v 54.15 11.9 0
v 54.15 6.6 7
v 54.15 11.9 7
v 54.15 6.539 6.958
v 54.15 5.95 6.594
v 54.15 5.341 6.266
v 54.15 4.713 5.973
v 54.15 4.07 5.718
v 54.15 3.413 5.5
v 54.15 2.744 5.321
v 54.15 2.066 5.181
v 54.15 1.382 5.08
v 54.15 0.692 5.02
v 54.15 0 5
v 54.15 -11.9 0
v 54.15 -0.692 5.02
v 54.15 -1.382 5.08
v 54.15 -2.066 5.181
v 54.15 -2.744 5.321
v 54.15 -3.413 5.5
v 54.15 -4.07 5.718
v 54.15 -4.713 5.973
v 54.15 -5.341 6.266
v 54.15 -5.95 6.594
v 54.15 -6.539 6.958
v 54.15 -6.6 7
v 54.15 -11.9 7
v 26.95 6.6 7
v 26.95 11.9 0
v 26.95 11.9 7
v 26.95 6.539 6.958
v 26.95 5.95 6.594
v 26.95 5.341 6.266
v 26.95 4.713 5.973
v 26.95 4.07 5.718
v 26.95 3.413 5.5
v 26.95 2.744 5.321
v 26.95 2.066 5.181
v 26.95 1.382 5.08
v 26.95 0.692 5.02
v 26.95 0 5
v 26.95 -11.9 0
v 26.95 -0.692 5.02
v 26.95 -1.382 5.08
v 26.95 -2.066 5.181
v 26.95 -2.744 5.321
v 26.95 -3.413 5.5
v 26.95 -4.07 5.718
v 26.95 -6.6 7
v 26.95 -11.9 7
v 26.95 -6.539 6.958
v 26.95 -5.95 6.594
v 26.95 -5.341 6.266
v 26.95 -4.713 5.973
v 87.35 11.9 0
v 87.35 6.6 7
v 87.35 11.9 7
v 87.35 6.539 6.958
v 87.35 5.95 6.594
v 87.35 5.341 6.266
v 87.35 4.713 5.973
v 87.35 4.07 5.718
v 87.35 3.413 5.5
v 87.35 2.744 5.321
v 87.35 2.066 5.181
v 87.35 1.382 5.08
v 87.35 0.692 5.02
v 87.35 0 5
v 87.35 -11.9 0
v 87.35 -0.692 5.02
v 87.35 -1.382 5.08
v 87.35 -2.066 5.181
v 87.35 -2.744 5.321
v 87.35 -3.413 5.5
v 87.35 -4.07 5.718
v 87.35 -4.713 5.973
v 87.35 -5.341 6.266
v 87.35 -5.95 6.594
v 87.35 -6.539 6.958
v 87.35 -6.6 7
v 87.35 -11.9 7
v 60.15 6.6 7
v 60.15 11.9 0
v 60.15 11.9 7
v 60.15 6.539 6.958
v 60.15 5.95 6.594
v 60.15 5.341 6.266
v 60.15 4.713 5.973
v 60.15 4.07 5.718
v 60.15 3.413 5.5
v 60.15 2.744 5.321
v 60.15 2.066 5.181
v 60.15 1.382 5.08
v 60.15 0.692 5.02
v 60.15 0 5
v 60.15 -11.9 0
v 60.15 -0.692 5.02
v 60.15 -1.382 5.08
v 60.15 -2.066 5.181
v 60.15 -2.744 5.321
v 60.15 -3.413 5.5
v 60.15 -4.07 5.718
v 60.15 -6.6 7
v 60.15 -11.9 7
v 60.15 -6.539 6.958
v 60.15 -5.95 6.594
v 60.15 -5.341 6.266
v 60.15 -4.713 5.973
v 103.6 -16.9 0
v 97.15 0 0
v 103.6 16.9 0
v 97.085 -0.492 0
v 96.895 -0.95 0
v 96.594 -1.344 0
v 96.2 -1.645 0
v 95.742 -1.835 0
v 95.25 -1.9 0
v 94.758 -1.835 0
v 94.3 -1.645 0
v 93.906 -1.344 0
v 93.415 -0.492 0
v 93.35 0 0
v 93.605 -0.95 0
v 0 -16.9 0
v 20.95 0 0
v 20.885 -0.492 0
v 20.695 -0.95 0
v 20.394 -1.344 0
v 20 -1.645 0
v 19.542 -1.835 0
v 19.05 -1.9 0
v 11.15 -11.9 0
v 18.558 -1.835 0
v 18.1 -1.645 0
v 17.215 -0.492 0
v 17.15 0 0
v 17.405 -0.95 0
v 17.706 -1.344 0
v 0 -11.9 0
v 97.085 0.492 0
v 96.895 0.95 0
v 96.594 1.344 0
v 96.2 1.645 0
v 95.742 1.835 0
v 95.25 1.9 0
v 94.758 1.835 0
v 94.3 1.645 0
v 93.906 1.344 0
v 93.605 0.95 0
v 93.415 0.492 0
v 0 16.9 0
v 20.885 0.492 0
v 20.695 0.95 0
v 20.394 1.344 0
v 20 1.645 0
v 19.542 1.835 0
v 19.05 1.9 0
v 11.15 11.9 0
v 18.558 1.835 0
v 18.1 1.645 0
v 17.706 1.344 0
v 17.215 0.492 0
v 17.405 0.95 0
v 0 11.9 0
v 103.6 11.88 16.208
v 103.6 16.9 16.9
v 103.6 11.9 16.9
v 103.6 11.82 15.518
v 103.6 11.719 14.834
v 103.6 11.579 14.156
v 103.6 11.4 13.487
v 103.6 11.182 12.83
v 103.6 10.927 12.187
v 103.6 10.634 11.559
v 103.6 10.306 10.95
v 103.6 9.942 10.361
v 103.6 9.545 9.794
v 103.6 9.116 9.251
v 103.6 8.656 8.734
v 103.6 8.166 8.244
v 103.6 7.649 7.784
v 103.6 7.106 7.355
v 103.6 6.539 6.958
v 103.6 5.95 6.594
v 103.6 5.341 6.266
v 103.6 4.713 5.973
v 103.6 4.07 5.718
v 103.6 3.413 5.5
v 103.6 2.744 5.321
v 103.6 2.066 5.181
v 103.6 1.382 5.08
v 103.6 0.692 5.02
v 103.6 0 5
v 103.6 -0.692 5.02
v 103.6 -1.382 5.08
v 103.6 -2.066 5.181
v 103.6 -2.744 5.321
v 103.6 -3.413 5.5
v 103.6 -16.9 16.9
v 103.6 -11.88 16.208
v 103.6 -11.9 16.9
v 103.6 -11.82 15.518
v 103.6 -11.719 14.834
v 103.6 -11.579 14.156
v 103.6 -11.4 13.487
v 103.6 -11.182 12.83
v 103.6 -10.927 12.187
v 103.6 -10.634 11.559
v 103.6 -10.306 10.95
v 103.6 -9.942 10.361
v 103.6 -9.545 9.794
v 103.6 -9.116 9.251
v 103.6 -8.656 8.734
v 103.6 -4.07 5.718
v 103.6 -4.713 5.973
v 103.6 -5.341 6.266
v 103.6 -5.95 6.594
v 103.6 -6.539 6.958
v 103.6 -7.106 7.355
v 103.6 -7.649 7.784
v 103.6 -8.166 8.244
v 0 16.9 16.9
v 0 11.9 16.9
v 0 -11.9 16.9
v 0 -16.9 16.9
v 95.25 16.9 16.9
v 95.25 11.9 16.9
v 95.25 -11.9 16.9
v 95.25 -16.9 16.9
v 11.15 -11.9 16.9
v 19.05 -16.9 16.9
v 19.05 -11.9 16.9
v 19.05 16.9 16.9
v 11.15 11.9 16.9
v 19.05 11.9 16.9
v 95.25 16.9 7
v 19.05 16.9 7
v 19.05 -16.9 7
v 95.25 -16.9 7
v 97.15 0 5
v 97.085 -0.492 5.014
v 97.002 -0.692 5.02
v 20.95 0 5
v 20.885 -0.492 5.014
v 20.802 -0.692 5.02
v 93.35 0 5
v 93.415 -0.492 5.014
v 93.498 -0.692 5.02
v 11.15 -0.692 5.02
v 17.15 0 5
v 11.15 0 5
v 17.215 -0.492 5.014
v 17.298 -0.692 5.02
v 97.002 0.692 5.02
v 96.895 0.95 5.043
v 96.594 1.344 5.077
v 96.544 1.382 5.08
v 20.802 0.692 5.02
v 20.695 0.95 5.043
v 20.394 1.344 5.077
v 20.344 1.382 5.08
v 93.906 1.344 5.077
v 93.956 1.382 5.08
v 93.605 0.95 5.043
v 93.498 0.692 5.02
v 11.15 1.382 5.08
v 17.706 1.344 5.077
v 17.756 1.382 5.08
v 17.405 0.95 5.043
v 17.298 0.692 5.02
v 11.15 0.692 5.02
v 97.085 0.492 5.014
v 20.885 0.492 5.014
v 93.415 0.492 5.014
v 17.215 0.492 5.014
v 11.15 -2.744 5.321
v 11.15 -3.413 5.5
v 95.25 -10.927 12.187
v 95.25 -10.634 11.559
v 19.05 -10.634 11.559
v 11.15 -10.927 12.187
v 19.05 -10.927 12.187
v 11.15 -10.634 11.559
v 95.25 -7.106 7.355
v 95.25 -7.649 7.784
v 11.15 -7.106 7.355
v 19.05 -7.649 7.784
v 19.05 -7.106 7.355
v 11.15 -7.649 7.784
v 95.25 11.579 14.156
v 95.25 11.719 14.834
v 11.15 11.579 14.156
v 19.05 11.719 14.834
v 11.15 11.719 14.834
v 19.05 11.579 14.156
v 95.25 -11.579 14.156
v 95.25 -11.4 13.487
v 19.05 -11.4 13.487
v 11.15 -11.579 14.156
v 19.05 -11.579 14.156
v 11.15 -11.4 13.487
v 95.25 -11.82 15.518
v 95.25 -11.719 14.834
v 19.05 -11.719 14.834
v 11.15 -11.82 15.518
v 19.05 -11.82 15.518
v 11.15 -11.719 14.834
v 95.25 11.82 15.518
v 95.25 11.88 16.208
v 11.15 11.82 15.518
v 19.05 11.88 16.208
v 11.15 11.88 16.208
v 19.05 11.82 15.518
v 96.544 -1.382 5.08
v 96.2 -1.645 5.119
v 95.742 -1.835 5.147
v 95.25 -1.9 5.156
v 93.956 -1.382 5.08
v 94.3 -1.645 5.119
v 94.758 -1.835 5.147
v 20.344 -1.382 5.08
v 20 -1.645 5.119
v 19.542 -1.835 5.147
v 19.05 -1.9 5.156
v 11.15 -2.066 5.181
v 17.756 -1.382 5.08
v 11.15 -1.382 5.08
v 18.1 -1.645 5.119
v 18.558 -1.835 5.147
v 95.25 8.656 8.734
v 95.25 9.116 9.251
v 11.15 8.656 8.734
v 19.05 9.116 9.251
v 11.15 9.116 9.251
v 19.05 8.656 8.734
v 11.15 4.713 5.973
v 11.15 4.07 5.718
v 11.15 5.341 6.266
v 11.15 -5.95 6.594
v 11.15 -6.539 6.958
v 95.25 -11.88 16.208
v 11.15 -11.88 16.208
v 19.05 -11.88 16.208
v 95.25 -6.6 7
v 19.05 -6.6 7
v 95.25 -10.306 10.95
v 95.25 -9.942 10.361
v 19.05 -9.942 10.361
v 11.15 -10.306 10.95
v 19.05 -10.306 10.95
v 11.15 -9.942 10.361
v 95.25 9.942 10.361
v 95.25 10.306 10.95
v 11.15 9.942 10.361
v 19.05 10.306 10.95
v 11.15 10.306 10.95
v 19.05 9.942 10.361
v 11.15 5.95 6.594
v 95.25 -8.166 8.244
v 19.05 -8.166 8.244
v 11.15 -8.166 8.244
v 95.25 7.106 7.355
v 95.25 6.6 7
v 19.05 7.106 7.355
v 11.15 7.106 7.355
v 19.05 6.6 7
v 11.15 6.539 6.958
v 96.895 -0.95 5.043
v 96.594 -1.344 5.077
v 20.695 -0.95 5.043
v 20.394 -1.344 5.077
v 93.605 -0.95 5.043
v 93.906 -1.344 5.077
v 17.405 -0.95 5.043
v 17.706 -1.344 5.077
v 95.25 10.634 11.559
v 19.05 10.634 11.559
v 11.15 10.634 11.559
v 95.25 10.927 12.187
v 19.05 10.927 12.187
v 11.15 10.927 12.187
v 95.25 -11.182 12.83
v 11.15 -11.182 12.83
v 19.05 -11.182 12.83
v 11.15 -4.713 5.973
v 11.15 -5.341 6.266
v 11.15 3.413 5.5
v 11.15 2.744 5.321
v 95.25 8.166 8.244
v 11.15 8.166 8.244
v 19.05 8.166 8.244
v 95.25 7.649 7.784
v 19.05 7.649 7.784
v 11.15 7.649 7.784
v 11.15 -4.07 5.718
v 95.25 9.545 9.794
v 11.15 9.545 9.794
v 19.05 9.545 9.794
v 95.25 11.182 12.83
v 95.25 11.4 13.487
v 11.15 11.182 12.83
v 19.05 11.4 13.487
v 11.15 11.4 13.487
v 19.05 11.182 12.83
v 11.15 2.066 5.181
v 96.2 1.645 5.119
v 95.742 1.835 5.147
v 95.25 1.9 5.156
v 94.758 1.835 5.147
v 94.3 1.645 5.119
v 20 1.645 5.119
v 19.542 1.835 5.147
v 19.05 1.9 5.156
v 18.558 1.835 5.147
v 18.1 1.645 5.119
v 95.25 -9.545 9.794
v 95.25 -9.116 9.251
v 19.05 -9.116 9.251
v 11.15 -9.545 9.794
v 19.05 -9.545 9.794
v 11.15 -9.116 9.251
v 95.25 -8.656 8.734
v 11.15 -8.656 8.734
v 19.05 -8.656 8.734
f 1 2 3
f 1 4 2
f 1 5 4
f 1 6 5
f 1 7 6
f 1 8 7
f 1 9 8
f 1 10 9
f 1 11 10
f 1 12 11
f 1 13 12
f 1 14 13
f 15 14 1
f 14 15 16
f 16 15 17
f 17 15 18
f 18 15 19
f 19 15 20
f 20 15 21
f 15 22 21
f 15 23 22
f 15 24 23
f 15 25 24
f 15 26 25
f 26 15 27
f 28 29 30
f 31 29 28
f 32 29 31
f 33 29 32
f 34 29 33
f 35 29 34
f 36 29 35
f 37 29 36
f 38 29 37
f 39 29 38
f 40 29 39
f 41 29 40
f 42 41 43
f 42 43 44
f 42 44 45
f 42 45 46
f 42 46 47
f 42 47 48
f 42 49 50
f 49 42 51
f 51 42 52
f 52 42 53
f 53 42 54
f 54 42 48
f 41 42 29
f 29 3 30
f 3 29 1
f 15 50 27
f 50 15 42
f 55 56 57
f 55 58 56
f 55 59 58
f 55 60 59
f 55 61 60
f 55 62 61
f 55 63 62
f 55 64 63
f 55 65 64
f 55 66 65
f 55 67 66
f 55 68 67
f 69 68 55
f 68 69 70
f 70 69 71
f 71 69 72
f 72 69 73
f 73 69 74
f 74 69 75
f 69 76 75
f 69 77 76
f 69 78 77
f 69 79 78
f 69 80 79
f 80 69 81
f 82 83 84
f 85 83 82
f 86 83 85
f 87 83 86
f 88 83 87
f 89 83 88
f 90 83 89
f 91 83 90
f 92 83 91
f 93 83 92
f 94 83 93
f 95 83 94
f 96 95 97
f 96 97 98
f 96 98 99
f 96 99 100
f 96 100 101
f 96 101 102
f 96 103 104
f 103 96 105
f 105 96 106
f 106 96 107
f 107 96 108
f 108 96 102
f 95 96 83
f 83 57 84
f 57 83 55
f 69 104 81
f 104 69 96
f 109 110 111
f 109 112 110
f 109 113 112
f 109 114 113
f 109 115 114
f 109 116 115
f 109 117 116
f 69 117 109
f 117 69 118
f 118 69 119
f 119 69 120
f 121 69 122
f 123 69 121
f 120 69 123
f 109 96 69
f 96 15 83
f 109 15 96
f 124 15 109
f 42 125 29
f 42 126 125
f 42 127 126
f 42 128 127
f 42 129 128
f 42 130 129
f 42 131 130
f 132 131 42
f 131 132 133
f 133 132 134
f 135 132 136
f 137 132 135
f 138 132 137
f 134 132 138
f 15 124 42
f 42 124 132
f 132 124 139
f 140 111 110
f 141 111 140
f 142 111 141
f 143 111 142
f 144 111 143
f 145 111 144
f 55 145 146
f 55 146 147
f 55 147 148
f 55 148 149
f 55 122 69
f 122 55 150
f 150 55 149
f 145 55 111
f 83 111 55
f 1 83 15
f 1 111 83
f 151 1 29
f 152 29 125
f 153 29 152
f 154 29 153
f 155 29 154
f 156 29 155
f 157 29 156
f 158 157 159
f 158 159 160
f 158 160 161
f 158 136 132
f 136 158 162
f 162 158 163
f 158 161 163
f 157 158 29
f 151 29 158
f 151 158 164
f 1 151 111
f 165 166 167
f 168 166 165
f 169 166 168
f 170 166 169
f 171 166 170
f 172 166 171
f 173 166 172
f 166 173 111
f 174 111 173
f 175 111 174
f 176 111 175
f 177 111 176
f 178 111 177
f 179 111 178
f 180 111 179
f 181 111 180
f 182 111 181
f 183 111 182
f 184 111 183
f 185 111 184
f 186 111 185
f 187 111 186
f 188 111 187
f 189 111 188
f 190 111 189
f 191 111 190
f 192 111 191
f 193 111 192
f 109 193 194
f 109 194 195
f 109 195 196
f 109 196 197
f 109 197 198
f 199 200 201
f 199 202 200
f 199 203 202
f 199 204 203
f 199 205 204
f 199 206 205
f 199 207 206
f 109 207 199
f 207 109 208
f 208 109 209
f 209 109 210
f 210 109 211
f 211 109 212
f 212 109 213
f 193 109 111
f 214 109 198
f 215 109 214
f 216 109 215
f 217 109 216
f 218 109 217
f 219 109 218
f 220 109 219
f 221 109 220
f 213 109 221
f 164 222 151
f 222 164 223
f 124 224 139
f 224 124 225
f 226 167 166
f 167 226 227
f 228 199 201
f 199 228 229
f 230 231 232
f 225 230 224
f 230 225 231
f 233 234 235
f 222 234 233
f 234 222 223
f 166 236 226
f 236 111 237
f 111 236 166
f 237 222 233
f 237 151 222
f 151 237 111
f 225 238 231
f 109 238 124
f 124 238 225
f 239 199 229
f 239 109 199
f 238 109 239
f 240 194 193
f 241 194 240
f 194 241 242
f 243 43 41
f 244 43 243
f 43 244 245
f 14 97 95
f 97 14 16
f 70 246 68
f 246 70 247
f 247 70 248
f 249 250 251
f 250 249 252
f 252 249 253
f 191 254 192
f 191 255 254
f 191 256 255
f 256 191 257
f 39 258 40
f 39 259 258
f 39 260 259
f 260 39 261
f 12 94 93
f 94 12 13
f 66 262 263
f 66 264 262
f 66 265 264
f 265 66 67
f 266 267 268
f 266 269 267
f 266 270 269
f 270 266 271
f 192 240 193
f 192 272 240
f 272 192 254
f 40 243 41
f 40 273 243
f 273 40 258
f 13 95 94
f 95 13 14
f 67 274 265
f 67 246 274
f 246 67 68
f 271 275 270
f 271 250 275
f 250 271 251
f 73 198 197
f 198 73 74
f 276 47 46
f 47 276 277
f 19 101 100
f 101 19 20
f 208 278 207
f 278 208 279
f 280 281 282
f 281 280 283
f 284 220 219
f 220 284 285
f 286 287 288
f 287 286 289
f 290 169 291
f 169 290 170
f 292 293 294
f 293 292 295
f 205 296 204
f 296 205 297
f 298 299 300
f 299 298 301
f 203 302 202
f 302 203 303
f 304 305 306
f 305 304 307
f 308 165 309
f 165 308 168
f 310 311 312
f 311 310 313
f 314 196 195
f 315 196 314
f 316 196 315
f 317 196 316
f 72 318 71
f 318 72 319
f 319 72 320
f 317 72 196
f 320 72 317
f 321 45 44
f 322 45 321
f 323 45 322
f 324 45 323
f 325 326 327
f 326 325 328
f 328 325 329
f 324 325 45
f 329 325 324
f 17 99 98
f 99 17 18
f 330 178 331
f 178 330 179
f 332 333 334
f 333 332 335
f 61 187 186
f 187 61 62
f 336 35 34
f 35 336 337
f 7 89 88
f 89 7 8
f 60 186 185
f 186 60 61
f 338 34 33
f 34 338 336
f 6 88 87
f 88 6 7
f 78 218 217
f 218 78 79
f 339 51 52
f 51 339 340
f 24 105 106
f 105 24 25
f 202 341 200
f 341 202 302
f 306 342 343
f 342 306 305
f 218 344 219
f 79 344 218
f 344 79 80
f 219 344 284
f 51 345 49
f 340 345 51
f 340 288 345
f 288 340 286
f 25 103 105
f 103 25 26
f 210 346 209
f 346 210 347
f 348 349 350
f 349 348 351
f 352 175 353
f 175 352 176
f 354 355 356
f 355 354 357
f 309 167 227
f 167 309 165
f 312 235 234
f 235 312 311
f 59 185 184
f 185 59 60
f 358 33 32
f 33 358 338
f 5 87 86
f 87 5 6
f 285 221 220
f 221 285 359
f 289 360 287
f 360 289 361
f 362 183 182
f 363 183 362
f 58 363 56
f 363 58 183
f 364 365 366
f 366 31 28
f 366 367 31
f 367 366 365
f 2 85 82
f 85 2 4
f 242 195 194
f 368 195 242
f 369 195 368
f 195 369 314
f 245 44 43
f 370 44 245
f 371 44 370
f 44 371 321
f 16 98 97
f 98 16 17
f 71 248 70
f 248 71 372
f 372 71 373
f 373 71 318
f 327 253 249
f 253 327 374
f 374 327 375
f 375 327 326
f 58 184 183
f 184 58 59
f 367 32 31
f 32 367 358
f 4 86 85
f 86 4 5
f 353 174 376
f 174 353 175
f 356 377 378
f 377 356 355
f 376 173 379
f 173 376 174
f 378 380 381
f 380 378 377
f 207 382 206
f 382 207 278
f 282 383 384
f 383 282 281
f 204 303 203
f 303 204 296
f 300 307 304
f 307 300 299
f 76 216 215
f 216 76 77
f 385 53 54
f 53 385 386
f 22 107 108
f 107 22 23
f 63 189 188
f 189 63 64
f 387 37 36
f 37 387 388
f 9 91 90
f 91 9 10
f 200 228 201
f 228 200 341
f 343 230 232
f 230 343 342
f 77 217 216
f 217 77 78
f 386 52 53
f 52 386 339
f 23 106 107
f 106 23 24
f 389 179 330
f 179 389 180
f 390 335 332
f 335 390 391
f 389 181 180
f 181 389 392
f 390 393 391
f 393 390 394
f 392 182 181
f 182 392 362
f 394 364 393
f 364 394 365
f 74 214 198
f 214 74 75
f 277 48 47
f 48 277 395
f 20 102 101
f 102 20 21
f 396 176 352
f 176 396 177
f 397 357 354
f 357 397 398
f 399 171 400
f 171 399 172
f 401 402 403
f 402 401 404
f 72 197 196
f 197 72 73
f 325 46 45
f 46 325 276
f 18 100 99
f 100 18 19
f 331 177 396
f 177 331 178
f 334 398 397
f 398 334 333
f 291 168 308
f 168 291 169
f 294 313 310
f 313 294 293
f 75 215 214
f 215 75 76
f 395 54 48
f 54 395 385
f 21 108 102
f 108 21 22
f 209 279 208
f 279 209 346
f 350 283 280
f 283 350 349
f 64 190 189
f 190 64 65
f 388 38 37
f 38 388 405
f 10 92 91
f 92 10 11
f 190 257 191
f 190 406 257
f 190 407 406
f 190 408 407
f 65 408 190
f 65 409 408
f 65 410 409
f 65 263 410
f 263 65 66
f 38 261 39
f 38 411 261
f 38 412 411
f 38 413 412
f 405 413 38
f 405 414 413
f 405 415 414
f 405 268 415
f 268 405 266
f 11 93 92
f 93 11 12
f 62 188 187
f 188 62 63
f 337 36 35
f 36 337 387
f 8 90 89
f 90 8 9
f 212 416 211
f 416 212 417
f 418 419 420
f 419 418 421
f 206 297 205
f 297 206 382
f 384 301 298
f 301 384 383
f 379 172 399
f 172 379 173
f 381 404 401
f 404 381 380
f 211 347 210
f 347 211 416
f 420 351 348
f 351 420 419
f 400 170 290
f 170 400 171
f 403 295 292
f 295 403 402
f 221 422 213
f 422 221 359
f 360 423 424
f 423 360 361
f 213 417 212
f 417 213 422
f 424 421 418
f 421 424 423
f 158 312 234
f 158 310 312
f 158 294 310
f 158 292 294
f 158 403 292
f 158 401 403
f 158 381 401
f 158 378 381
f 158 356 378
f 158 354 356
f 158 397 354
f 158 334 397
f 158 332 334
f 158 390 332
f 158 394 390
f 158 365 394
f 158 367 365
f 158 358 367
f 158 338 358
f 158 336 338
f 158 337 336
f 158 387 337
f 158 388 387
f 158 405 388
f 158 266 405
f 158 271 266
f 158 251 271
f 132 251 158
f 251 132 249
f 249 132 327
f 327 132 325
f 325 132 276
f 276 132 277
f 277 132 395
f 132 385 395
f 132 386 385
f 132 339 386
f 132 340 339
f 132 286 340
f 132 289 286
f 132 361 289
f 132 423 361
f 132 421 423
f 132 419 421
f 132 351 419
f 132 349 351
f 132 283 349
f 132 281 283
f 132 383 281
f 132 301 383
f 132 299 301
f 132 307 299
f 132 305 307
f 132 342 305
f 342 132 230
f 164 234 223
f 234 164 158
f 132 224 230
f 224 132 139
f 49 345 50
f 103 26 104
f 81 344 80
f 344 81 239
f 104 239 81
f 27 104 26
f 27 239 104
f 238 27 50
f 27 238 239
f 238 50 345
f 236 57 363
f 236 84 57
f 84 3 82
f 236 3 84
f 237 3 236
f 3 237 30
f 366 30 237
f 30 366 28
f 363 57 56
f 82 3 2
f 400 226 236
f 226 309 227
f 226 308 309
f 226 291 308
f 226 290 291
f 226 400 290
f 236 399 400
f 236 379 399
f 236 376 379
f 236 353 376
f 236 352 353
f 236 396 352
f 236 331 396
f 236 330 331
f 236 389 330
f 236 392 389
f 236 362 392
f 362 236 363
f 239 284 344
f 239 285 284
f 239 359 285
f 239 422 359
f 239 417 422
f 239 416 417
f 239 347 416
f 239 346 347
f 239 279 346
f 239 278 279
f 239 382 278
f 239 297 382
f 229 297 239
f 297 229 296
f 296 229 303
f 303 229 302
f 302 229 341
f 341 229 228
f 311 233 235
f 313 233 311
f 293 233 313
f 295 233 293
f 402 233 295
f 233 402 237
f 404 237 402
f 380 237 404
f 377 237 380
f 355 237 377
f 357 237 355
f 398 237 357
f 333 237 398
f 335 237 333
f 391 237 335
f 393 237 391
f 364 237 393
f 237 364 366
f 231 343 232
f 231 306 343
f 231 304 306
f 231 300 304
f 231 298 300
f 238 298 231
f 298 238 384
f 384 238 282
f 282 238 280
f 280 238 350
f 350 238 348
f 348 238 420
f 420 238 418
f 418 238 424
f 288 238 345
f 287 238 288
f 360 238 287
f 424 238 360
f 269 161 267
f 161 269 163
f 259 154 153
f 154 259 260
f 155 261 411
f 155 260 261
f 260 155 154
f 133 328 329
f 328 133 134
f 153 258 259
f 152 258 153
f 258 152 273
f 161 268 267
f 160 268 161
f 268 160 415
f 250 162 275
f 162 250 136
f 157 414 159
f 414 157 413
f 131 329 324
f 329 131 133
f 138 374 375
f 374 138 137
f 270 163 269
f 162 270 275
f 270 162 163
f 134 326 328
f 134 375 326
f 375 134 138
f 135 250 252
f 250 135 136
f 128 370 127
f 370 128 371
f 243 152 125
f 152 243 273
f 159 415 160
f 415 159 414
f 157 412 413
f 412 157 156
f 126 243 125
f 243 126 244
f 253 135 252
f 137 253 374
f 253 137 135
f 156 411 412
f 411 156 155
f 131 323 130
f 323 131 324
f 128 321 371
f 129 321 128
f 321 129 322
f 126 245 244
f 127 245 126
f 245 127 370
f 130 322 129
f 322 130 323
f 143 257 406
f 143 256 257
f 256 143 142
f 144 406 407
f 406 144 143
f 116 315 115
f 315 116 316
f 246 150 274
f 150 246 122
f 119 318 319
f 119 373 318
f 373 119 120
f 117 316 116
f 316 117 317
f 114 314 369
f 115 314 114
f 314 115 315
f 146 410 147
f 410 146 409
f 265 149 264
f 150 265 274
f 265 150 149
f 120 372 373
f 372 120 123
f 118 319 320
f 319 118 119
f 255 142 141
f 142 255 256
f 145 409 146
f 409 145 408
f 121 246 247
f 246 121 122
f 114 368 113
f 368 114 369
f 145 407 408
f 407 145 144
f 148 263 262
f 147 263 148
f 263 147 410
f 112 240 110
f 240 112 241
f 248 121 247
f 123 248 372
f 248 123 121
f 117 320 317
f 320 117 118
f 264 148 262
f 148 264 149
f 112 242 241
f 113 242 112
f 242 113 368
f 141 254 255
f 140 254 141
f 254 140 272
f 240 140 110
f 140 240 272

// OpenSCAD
//Drill guide for Mostly Printed CNC Z Pipe
//7/3/2015  By: David Bunch
//Revised center cuts for larger Diameter holes to work better

//CUSTOMIZER VARIABLES

//1. Spacing between Nuts (Standard is 76.2mm)
NutSpacing = 76.2;      //(I used 53mm for the rotary tool I am using)

//2. Dia of Drill Hole (9/64" Drill bit, Added .2mm for slip fit)
//M3 = 3.8;
DrSize = 3.8;

//3. Pipe Dia. to Use (Added 0.8 for slight tight fit)
OD = 23.8;              //23.7mm was a little tight & 24.0 was a little loose for me

//4. Thickness at bottom of Pipe
Thickness = 5;

//5. Resolution of Pipe (108 gives .688mm length segments)
Pipe_res = 108;

//6. Resolution of holes (24 gives .497mm length segments)
Hole_res = 24;

//7. Offset from Left for 1st Nut Trap
LtNutOffset = 19.05;      //Original Design is 19.05mm

//8. Offset from Right of 2nd Nut Trap (Original is 6.35mm)
RtNutOffset = 8.35;       //(I decided to add 2mm to this gap)

//9. Center Clamp Width
Cl_Wid = 6;

//10. Number of Holes (1 or 2)
Num_Holes=2;

//11. Print 1 or 2 Nut Traps
Qty = 1;

//CUSTOMIZER VARIABLES END
//----------------------------------------
//Begin calculations based on input variables
TotCenGap=NutSpacing - DrSize - 12;         //I use 6mm plastic around holes
echo("TotCenGap = ",TotCenGap);

DrRad = DrSize / 2;
THK = OD /2 + Thickness;

DrLen = OD + Thickness + Thickness+2;

echo("THK = ",THK);

Width = OD + Thickness + Thickness;
echo("Width = ",Width);

WidSlice=Width+2;
Rad=OD/2;
echo("Rad = ", Rad);

Ht=LtNutOffset+NutSpacing+RtNutOffset;
echo("Ht = ", Ht);

CenCub_Z = LtNutOffset + DrRad + 6;         //6mm of plastic each side of hole

CenCubLen1 = TotCenGap;                     //Use this if Cl_Wid = 0;
CenCubLen2 = (TotCenGap - Cl_Wid) / 2;

echo("CenCubLen1 = ", CenCubLen1);
echo("CenCubLen2 = ", CenCubLen2);

module Base()
{
    translate([0,0,THK])
    rotate([0,90,0])
    difference()
    {
        translate([0,-THK])
        cube([THK,Width,Ht]);                   //Basic starting cube
        translate([0,0,-1])
        cylinder(d=OD,h=Ht+2,$fn=Pipe_res);     //Cut for where pipe is laid
        if (Cl_Wid > 0)
        {
            translate([-1,-Rad,CenCub_Z])
            cube([OD,OD,CenCubLen2]);           //cube cut out of 1st part of center
            translate([-1,-Rad,CenCub_Z + CenCubLen2 + Cl_Wid])
            cube([OD,OD,CenCubLen2]);           //cube cut out of 2nd part of center
        } else {
            translate([-1,-Rad,CenCub_Z])
            cube([OD,OD,CenCubLen1]);          //cube cut out of center
        }
        translate([-1,-Rad,-1])
        cube([OD,OD,(LtNutOffset - DrRad - 6) + 1]);         //Slice a cube cut at left side
        translate([-(Thickness+2),-(WidSlice/2),LtNutOffset])
        cube([THK,WidSlice,NutSpacing]);        //Slice across Top for less plastic

        translate([0,0,LtNutOffset])
        rotate([0,90,0])
        cylinder(d=DrSize,h=DrLen,center=true,$fn=Hole_res);       //Drill Bottom Hole

        if (Num_Holes == 2)
        {
                translate([0,0,LtNutOffset+NutSpacing])
                rotate([0,90,0])
                cylinder(d=DrSize,h=DrLen,center=true,$fn=Hole_res);    //Drill Top Hole
        }
    }
}
Base();
if (Qty == 2)
{
    translate([0,Width+6,0])
    Base();
}
